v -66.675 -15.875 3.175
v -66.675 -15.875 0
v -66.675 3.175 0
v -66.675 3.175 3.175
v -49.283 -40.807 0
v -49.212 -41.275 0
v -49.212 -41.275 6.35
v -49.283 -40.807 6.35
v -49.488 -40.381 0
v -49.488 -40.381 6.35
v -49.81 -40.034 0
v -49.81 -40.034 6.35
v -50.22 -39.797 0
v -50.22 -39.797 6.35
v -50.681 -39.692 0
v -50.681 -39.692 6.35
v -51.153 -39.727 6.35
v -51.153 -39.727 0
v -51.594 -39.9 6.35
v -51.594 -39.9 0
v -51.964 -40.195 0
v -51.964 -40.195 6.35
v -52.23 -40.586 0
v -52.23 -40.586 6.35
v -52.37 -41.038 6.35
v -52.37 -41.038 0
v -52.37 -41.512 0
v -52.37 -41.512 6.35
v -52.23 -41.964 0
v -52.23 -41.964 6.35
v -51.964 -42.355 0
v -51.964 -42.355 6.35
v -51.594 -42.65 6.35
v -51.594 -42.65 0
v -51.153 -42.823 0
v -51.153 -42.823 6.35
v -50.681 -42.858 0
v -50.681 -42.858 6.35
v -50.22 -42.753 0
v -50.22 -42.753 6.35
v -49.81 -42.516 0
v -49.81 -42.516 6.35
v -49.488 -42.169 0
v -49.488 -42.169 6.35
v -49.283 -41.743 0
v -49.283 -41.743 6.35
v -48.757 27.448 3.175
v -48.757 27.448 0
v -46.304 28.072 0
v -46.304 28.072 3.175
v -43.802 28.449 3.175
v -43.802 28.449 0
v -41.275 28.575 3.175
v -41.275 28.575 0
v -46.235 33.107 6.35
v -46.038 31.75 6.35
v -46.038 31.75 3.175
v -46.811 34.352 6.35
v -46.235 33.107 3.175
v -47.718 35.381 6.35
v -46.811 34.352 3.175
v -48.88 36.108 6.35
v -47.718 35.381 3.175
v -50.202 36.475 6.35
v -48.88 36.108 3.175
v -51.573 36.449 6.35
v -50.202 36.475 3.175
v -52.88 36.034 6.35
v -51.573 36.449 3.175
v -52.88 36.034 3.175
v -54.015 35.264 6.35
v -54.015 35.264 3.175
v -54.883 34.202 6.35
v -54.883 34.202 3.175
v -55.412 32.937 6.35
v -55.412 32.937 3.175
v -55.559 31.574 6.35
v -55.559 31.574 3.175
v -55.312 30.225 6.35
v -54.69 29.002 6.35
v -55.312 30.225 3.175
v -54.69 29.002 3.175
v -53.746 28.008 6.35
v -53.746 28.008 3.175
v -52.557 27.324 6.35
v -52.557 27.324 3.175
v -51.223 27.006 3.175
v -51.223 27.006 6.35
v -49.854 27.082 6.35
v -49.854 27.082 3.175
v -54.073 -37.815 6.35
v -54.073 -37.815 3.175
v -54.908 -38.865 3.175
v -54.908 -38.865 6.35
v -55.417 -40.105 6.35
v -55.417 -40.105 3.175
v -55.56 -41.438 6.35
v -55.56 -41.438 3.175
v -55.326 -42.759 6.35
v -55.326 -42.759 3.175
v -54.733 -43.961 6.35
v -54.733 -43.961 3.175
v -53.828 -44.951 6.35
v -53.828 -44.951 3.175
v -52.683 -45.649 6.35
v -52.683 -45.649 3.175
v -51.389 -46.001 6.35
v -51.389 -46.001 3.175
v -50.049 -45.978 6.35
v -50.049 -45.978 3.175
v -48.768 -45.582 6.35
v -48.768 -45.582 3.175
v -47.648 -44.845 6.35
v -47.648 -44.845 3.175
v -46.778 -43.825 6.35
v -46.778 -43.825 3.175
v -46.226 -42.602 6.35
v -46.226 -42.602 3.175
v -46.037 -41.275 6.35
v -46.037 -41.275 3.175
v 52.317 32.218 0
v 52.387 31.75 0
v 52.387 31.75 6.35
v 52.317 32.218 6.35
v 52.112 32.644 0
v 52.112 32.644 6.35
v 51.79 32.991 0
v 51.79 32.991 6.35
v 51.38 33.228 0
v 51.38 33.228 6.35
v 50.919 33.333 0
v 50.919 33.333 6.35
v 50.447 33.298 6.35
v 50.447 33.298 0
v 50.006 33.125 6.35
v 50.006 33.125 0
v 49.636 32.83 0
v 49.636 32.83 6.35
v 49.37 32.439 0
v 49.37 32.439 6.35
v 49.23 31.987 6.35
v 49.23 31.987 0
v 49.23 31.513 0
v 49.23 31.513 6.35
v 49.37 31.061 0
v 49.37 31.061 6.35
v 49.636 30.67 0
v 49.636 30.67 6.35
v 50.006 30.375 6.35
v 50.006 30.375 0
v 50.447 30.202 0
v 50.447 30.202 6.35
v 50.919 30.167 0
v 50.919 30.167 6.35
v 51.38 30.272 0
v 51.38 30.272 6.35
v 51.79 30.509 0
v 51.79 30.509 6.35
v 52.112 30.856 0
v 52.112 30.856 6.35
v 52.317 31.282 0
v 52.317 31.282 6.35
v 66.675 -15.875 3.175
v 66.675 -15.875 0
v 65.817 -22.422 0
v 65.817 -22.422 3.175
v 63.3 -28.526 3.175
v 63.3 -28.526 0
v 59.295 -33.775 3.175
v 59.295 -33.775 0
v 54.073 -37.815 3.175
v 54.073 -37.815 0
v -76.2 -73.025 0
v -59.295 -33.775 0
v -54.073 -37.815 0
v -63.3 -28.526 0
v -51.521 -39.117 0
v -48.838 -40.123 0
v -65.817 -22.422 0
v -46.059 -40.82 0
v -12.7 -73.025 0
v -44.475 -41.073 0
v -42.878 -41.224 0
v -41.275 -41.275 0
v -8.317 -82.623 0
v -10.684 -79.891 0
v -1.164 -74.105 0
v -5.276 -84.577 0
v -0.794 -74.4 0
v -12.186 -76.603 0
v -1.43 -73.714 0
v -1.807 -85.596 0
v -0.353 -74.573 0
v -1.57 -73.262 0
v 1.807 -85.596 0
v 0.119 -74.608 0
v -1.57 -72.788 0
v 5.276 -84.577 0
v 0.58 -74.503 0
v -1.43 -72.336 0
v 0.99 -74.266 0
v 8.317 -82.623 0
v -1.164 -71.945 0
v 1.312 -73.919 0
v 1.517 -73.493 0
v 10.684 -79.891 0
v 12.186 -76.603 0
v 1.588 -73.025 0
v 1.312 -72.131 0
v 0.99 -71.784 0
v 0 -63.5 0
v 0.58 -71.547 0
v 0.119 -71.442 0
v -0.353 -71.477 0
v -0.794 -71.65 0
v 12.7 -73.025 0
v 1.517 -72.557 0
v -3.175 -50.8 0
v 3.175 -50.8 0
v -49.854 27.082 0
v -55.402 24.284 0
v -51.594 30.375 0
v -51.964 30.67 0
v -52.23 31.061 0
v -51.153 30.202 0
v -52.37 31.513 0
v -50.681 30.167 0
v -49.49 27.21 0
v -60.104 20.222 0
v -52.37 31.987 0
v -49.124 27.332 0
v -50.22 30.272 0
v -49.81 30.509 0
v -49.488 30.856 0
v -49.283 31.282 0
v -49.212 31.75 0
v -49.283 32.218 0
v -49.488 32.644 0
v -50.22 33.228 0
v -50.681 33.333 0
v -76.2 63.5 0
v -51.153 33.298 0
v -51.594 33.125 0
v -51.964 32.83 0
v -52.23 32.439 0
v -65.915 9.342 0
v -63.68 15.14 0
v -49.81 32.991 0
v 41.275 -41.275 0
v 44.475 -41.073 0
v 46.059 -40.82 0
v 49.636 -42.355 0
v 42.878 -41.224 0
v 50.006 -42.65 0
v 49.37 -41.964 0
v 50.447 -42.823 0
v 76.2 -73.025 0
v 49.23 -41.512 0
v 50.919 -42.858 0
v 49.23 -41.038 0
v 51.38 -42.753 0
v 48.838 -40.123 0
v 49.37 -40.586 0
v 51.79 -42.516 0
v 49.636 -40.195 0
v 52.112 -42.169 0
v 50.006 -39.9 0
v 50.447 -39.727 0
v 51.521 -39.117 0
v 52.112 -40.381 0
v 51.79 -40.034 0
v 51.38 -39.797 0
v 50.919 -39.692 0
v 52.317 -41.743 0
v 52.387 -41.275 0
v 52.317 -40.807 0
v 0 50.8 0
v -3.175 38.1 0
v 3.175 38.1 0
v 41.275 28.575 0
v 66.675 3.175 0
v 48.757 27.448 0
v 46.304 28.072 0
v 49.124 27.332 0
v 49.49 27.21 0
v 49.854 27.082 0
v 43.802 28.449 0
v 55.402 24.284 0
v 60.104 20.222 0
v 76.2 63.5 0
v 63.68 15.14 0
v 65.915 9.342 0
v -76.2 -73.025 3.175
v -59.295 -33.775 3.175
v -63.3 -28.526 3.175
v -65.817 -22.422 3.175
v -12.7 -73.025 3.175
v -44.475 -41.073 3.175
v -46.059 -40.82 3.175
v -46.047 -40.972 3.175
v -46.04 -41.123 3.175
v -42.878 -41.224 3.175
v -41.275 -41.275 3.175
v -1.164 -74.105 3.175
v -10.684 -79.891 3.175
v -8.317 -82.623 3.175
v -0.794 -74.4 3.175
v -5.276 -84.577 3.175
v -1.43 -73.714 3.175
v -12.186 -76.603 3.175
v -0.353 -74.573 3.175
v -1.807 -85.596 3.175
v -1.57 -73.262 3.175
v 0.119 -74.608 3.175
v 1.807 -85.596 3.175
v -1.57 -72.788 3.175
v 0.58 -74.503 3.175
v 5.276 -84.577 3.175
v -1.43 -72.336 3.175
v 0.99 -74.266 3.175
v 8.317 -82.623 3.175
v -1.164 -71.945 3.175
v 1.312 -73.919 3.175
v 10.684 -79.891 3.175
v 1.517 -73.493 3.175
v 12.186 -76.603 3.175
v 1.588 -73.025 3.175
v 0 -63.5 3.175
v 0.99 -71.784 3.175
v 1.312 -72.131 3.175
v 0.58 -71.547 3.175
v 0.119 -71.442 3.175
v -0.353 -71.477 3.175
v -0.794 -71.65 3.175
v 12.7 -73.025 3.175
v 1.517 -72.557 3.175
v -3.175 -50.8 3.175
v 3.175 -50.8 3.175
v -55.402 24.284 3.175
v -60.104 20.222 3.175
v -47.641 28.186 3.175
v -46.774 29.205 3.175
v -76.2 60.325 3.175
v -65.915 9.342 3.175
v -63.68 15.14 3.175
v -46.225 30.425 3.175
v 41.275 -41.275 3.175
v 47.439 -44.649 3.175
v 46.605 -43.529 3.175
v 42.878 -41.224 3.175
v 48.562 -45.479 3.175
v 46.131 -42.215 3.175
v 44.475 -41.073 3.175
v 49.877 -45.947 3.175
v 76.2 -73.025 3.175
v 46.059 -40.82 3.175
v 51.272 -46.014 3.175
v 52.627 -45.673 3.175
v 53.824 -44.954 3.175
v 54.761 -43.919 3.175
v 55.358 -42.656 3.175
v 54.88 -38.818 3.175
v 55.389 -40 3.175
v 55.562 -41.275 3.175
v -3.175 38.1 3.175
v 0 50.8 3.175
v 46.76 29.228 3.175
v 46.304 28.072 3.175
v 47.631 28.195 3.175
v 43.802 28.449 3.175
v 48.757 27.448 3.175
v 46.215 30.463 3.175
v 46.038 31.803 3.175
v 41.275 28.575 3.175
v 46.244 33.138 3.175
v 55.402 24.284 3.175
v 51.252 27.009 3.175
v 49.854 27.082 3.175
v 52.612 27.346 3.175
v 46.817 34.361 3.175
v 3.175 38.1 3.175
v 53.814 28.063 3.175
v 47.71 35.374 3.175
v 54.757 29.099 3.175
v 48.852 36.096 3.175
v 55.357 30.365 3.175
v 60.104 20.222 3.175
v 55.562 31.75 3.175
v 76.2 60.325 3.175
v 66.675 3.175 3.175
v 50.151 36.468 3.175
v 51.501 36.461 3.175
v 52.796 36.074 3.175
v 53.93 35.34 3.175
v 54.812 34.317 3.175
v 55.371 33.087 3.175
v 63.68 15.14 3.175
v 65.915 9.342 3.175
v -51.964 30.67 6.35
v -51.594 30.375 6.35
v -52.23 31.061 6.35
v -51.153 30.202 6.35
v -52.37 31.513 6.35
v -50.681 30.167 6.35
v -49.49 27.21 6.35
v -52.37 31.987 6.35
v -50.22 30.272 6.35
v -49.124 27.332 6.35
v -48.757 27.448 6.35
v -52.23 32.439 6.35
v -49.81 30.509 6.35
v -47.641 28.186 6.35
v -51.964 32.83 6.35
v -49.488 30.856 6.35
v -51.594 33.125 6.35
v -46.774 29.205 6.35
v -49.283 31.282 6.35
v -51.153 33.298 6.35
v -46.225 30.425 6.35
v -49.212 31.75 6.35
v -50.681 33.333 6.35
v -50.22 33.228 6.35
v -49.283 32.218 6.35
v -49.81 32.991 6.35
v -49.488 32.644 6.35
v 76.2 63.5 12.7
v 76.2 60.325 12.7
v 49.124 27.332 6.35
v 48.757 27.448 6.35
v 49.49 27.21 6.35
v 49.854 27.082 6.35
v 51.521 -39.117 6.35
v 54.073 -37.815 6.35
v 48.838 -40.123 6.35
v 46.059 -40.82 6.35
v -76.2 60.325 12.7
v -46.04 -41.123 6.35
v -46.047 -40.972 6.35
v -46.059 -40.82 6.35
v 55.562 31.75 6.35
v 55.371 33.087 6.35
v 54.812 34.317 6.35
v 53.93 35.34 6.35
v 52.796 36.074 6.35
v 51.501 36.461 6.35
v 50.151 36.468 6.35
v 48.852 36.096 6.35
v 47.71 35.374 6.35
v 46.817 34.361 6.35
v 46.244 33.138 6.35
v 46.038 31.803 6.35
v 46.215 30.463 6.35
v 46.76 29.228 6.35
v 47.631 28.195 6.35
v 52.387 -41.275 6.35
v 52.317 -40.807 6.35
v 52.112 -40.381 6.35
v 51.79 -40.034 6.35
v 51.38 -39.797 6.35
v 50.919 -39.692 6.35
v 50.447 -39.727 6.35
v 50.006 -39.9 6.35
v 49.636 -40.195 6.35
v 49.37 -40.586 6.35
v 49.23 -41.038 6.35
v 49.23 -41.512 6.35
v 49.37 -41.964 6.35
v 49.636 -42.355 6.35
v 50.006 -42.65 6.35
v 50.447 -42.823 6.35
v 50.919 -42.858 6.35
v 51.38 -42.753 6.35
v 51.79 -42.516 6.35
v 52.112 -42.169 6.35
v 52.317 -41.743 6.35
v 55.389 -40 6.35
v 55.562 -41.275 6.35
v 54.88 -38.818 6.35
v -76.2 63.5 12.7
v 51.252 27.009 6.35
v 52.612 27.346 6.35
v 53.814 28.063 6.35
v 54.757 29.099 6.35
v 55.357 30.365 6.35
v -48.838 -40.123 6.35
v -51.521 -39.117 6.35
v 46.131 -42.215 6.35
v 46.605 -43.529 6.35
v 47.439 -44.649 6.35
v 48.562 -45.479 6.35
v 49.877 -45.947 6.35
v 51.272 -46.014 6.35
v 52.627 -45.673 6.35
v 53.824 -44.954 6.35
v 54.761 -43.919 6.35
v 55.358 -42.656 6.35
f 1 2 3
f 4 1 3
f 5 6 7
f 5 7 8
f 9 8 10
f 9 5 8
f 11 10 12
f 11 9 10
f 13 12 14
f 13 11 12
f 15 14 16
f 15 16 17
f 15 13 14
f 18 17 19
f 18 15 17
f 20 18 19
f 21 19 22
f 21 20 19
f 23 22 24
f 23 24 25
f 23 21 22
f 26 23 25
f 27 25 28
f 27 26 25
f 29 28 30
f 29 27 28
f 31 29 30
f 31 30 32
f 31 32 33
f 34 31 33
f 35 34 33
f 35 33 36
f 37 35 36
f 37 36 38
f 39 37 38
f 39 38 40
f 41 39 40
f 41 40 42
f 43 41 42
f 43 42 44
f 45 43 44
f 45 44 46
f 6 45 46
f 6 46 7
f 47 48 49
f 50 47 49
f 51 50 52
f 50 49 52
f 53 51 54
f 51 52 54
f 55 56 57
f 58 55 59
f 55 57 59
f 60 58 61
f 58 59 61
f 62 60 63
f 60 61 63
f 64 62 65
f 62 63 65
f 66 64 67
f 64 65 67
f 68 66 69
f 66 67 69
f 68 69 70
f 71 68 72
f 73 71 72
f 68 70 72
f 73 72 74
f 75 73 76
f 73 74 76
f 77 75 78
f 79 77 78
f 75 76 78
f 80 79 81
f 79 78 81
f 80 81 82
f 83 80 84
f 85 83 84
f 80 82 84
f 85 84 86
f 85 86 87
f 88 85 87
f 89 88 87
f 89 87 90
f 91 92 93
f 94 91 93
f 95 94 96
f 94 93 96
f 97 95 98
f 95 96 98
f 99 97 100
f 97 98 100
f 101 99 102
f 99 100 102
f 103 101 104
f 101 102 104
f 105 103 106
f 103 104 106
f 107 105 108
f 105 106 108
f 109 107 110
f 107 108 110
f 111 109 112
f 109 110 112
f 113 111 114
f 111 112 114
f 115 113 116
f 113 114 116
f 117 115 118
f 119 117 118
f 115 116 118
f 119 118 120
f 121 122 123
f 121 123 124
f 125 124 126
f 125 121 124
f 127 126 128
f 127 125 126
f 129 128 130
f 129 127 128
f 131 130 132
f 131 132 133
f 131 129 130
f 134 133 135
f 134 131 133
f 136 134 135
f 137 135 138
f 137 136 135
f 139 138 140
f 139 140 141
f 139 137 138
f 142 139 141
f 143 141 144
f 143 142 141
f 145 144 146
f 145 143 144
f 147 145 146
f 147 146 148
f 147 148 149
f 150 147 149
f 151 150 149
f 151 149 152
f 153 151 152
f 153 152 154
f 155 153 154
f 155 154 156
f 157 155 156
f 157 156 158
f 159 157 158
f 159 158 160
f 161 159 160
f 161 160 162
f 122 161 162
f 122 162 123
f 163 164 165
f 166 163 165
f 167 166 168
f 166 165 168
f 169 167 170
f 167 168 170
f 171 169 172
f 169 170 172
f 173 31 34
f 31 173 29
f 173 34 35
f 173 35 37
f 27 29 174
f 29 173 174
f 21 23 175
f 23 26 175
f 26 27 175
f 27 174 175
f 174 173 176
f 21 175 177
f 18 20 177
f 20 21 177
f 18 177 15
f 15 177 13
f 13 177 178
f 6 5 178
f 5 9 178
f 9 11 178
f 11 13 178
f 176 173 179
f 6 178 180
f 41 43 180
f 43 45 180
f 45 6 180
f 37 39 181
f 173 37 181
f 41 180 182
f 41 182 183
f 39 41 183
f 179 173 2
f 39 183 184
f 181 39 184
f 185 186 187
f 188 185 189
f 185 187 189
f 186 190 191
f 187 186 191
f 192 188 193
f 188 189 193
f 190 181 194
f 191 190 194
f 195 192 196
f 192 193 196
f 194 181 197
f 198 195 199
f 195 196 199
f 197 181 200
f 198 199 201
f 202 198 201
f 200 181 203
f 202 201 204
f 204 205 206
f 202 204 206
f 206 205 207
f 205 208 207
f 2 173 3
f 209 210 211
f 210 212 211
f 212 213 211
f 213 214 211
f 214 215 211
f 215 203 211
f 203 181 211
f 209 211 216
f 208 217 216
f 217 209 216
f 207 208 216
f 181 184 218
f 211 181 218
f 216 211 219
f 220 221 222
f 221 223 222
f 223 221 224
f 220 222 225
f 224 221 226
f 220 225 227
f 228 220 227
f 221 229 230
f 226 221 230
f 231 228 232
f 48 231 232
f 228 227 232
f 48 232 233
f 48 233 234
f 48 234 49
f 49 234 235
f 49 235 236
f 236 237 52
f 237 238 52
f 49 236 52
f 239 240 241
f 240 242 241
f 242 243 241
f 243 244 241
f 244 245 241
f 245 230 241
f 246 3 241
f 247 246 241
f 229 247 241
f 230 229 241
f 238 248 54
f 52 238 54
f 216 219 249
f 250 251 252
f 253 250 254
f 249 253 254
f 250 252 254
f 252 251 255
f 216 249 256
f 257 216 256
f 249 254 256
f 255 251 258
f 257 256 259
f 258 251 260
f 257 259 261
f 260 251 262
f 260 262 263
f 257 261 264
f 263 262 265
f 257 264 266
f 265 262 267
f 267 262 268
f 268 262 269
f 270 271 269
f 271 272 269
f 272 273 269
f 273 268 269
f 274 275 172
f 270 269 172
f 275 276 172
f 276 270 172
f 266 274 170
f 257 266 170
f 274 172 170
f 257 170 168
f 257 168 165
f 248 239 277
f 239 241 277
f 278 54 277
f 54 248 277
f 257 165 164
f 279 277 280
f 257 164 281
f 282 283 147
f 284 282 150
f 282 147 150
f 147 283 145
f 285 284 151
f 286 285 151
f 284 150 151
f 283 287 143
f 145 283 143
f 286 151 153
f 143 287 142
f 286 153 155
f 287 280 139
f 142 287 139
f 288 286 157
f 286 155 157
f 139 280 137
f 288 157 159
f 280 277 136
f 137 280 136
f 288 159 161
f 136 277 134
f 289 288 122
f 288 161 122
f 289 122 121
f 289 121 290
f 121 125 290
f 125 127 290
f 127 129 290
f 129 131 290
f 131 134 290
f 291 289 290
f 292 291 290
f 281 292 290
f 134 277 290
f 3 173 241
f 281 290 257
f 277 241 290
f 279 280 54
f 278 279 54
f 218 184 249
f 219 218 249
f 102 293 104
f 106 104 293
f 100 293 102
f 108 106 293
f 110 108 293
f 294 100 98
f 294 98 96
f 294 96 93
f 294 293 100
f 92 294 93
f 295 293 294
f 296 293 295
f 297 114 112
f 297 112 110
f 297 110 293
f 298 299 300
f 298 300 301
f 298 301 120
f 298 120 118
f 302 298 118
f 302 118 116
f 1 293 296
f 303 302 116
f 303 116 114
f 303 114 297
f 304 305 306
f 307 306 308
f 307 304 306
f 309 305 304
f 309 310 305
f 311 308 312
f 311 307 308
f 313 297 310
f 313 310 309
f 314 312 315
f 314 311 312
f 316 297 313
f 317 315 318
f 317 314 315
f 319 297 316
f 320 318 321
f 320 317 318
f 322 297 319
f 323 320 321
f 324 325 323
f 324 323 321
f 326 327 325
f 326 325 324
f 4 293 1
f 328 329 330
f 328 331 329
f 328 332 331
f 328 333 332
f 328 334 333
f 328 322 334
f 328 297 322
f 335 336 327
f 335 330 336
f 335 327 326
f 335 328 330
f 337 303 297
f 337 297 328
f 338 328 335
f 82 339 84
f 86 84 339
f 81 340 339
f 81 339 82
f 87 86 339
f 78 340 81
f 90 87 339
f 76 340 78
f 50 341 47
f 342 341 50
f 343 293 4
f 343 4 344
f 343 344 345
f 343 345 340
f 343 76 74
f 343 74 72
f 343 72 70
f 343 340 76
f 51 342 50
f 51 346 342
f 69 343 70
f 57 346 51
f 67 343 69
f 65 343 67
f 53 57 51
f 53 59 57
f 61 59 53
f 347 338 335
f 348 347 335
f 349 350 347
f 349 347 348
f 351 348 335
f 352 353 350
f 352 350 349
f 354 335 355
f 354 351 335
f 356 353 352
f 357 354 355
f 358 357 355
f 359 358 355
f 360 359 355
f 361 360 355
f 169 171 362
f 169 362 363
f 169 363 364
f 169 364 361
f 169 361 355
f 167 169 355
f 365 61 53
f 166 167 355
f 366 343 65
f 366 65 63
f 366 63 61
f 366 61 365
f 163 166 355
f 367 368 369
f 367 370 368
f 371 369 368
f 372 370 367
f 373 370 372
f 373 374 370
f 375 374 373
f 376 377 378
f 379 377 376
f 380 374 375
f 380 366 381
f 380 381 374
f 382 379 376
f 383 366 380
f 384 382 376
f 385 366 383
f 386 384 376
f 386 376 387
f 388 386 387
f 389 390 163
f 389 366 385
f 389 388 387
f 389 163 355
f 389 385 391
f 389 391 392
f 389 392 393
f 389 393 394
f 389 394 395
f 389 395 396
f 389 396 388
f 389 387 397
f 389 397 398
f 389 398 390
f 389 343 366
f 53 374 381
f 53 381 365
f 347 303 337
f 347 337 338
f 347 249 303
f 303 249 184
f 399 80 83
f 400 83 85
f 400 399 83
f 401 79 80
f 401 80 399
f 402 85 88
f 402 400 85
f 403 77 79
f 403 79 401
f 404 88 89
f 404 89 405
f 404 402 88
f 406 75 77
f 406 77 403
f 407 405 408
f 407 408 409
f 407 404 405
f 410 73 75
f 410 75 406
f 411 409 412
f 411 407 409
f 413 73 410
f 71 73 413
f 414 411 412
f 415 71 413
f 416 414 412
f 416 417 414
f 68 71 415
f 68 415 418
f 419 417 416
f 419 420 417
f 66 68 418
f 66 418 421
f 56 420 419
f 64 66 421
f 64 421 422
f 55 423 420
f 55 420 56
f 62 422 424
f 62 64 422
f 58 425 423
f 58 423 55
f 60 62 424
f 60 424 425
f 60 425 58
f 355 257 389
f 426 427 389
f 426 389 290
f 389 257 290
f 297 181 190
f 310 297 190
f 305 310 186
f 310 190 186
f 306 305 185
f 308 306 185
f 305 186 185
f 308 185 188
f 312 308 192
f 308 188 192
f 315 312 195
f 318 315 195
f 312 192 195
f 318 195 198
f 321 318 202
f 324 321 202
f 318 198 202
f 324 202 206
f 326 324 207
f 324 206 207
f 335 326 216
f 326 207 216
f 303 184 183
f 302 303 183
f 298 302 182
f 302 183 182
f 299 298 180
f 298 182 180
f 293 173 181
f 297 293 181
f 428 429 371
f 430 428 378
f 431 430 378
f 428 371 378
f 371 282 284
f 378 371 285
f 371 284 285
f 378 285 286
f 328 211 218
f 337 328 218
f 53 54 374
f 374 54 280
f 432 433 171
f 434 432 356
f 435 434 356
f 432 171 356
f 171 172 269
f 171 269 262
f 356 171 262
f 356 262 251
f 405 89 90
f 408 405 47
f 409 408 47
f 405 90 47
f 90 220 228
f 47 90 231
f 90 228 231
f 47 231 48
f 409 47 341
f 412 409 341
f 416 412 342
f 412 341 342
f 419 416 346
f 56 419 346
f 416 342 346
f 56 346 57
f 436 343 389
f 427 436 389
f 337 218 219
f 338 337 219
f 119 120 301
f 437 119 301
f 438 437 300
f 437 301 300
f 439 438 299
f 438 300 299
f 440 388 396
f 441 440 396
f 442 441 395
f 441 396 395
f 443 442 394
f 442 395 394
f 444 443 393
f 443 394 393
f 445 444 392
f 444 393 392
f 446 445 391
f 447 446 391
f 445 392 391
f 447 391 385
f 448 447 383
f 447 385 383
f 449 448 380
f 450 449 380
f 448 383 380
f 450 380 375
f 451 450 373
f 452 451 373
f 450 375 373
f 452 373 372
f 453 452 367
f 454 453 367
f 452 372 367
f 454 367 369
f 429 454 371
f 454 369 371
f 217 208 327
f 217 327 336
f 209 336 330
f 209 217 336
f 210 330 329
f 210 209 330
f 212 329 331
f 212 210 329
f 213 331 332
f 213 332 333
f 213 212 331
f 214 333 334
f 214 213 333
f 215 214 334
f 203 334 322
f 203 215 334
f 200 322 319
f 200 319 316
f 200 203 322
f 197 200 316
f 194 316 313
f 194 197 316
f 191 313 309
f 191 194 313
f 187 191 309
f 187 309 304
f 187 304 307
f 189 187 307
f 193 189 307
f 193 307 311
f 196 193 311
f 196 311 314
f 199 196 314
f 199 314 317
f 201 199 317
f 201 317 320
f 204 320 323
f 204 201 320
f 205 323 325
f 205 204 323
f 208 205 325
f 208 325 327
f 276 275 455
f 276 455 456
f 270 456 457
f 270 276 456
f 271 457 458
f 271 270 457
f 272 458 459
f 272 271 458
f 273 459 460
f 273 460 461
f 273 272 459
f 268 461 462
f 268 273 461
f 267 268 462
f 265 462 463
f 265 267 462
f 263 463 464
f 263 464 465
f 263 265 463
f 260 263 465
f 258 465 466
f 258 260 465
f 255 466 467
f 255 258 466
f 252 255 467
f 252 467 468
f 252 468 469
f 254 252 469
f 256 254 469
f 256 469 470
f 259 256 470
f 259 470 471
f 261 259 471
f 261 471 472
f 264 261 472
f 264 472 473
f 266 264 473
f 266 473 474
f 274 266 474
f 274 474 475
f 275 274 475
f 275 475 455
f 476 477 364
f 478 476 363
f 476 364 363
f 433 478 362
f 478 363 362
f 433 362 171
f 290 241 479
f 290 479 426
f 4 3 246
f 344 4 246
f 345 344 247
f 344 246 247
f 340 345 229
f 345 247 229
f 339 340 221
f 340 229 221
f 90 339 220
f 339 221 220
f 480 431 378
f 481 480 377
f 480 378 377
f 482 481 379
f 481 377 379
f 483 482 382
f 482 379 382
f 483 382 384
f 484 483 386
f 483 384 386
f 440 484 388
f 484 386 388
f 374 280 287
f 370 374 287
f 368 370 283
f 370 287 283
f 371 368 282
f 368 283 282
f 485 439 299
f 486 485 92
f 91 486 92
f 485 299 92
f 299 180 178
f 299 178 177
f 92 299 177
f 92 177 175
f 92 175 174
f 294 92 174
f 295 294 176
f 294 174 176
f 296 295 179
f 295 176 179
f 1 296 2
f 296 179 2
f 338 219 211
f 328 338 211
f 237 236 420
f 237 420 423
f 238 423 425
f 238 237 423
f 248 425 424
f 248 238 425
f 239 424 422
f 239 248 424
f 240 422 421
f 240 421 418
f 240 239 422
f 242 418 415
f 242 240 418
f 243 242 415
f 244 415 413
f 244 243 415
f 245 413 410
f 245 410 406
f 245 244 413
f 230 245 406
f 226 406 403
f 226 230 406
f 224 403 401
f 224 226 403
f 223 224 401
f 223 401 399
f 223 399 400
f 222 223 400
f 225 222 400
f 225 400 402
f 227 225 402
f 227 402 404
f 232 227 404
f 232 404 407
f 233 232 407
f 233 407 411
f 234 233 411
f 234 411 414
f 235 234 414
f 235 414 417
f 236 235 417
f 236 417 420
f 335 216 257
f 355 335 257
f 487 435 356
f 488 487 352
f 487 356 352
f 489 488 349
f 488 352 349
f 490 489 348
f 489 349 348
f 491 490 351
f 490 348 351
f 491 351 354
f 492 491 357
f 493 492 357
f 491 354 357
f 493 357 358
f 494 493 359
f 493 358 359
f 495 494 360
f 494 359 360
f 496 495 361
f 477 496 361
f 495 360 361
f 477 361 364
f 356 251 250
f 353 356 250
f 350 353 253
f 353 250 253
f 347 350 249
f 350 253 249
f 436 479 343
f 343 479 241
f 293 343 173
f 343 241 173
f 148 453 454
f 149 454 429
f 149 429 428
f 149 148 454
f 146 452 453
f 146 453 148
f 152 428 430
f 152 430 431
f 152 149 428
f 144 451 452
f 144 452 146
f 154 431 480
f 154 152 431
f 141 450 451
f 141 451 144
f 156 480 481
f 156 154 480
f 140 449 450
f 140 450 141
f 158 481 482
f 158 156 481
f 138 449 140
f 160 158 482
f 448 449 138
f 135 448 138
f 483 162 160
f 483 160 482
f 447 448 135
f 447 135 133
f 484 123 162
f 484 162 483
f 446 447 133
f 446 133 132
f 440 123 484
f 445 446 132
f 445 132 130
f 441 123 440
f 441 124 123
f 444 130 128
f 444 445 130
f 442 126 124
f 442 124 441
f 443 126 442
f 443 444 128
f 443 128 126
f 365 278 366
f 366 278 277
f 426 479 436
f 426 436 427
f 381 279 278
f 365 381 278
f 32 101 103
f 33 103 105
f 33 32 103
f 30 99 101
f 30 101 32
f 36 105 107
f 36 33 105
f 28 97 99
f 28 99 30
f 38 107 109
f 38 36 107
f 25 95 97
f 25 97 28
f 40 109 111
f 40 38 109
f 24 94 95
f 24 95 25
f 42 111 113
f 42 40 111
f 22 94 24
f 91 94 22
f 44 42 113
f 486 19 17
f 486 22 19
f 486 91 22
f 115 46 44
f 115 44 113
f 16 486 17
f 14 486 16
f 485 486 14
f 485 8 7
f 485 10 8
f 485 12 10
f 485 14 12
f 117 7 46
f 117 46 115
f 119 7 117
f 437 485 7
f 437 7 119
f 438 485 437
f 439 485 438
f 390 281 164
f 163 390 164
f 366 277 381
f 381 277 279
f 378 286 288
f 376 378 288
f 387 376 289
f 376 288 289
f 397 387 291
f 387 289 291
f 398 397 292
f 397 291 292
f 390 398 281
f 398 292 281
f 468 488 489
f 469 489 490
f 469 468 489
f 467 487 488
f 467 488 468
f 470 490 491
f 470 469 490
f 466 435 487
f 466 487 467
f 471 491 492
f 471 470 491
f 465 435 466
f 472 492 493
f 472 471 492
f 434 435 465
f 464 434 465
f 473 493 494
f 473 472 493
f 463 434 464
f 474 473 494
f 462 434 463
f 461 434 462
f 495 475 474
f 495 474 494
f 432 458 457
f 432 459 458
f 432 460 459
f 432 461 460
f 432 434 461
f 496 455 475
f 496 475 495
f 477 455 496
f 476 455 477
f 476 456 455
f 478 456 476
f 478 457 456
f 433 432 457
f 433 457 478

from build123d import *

# Parameters (mm, degrees)
F0_R     = 1.5875
F0_W     = 152.4
F0_H     = 3.175
F1_DEPTH = 3.175
F2_DEPTH = 6.35
F3_DEPTH = 12.7


# Not quite as in the source:
# - a feature names something its author has since deleted; it is built from what else it names


with BuildPart() as f1:
    # F0 (on Top) → F1 (new body)
    with BuildSketch(Plane.XY):
        with BuildLine():
            Line((76.2, -63.5), (76.2, 60.325))
            Line((76.2, 60.325), (-76.2, 60.325))
            Line((-76.2, 60.325), (-76.2, -63.5))
            Line((-76.2, -63.5), (-76.2, -73.025))
            Line((-76.2, -73.025), (-12.7, -73.025))
            ThreePointArc((-12.7, -73.025), (0, -85.725), (12.7, -73.025))
            Line((12.7, -73.025), (76.2, -73.025))
            Line((76.2, -73.025), (76.2, -63.5))
        make_face()
        with Locations((0, -73.025)):
            Circle(F0_R, mode=Mode.SUBTRACT)
        Polygon((3.175, -50.8), (0, -63.5), (-3.175, -50.8), align=None, mode=Mode.SUBTRACT)
        with BuildLine():
            ThreePointArc((-49.8535963292, 27.0824817792), (-54.4870485305, 34.7644782938), (-46.0375, 31.75))
            ThreePointArc((-46.0375, 31.75), (-46.7742676703, 29.2054203766), (-48.7566120041, 27.4481432208))
            ThreePointArc((-48.7566120041, 27.4481432208), (-45.0579989552, 28.2917059724), (-41.275, 28.575))
            Line((-41.275, 28.575), (41.275, 28.575))
            ThreePointArc((41.275, 28.575), (45.0579989552, 28.2917059724), (48.7566120041, 27.4481432208))
            ThreePointArc((48.7566120041, 27.4481432208), (48.2554203766, 35.7757323297), (55.5625, 31.75))
            ThreePointArc((55.5625, 31.75), (53.8144782938, 28.0629514695), (49.8535963292, 27.0824817792))
            ThreePointArc((49.8535963292, 27.0824817792), (62.0482562055, 17.7911495141), (66.675, 3.175))
            Line((66.675, 3.175), (66.675, -15.875))
            ThreePointArc((66.675, -15.875), (63.3002757063, -28.525977435), (54.0728559007, -37.8152571622))
            ThreePointArc((54.0728559007, -37.8152571622), (55.1742646512, -39.3915948361), (55.5625, -41.275))
            ThreePointArc((55.5625, -41.275), (50.5724196506, -46.0320593264), (46.0592502637, -40.8203592761))
            ThreePointArc((46.0592502637, -40.8203592761), (43.6779018277, -41.1610843708), (41.275, -41.275))
            Line((41.275, -41.275), (-41.275, -41.275))
            ThreePointArc((-41.275, -41.275), (-43.6779018277, -41.1610843708), (-46.0592502637, -40.8203592761))
            ThreePointArc((-46.0592502637, -40.8203592761), (-46.0429406736, -41.0474196506), (-46.0375, -41.275))
            ThreePointArc((-46.0375, -41.275), (-52.6834051639, -45.6492646512), (-54.0728559007, -37.8152571622))
            ThreePointArc((-54.0728559007, -37.8152571622), (-63.3002757063, -28.525977435), (-66.675, -15.875))
            Line((-66.675, -15.875), (-66.675, 3.175))
            ThreePointArc((-66.675, 3.175), (-62.0482562055, 17.7911495141), (-49.8535963292, 27.0824817792))
        make_face(mode=Mode.SUBTRACT)
        Polygon((-3.175, 38.1), (0, 50.8), (3.175, 38.1), align=None, mode=Mode.SUBTRACT)
        with Locations((0, 61.9125)):
            Rectangle(F0_W, F0_H)
        with BuildLine():
            ThreePointArc((-48.7566120041, 27.4481432208), (-46.7742676703, 29.2054203766), (-46.0375, 31.75))
            ThreePointArc((-46.0375, 31.75), (-54.4870485305, 34.7644782938), (-49.8535963292, 27.0824817792))
            ThreePointArc((-49.8535963292, 27.0824817792), (-49.3071852568, 27.2715557705), (-48.7566120041, 27.4481432208))
        make_face()
        with Locations((-50.8, 31.75)):
            Circle(F0_R, mode=Mode.SUBTRACT)
        with BuildLine():
            ThreePointArc((55.5625, 31.75), (48.2554203766, 35.7757323297), (48.7566120041, 27.4481432208))
            ThreePointArc((48.7566120041, 27.4481432208), (49.3071852568, 27.2715557705), (49.8535963292, 27.0824817792))
            ThreePointArc((49.8535963292, 27.0824817792), (53.8144782938, 28.0629514695), (55.5625, 31.75))
        make_face()
        with Locations((50.8, 31.75)):
            Circle(F0_R, mode=Mode.SUBTRACT)
        with BuildLine():
            ThreePointArc((54.0728559007, -37.8152571622), (50.1935354163, -39.6577611103), (46.0592502637, -40.8203592761))
            ThreePointArc((46.0592502637, -40.8203592761), (50.5724196506, -46.0320593264), (55.5625, -41.275))
            ThreePointArc((55.5625, -41.275), (55.1742646512, -39.3915948361), (54.0728559007, -37.8152571622))
        make_face()
        with Locations((50.8, -41.275)):
            Circle(F0_R, mode=Mode.SUBTRACT)
        with BuildLine():
            ThreePointArc((-46.0592502637, -40.8203592761), (-50.1935354163, -39.6577611103), (-54.0728559007, -37.8152571622))
            ThreePointArc((-54.0728559007, -37.8152571622), (-52.6834051639, -45.6492646512), (-46.0375, -41.275))
            ThreePointArc((-46.0375, -41.275), (-46.0429406736, -41.0474196506), (-46.0592502637, -40.8203592761))
        make_face()
        with Locations((-50.8, -41.275)):
            Circle(F0_R, mode=Mode.SUBTRACT)
    extrude(amount=F1_DEPTH)

    # F0 (on Top) → F2 (join)
    with BuildSketch(Plane.XY):
        with BuildLine():
            ThreePointArc((-46.0592502637, -40.8203592761), (-50.1935354163, -39.6577611103), (-54.0728559007, -37.8152571622))
            ThreePointArc((-54.0728559007, -37.8152571622), (-52.6834051639, -45.6492646512), (-46.0375, -41.275))
            ThreePointArc((-46.0375, -41.275), (-46.0429406736, -41.0474196506), (-46.0592502637, -40.8203592761))
        make_face()
        with Locations((-50.8, -41.275)):
            Circle(F0_R, mode=Mode.SUBTRACT)
        with BuildLine():
            ThreePointArc((-48.7566120041, 27.4481432208), (-46.7742676703, 29.2054203766), (-46.0375, 31.75))
            ThreePointArc((-46.0375, 31.75), (-54.4870485305, 34.7644782938), (-49.8535963292, 27.0824817792))
            ThreePointArc((-49.8535963292, 27.0824817792), (-49.3071852568, 27.2715557705), (-48.7566120041, 27.4481432208))
        make_face()
        with Locations((-50.8, 31.75)):
            Circle(F0_R, mode=Mode.SUBTRACT)
        with BuildLine():
            ThreePointArc((54.0728559007, -37.8152571622), (50.1935354163, -39.6577611103), (46.0592502637, -40.8203592761))
            ThreePointArc((46.0592502637, -40.8203592761), (50.5724196506, -46.0320593264), (55.5625, -41.275))
            ThreePointArc((55.5625, -41.275), (55.1742646512, -39.3915948361), (54.0728559007, -37.8152571622))
        make_face()
        with Locations((50.8, -41.275)):
            Circle(F0_R, mode=Mode.SUBTRACT)
        with BuildLine():
            ThreePointArc((55.5625, 31.75), (48.2554203766, 35.7757323297), (48.7566120041, 27.4481432208))
            ThreePointArc((48.7566120041, 27.4481432208), (49.3071852568, 27.2715557705), (49.8535963292, 27.0824817792))
            ThreePointArc((49.8535963292, 27.0824817792), (53.8144782938, 28.0629514695), (55.5625, 31.75))
        make_face()
        with Locations((50.8, 31.75)):
            Circle(F0_R, mode=Mode.SUBTRACT)
    extrude(amount=F2_DEPTH)

    # F0 (on Top) → F3 (join)
    with BuildSketch(Plane.XY):
        with Locations((0, 61.9125)):
            Rectangle(F0_W, F0_H)
    extrude(amount=F3_DEPTH)


solid = f1.part
